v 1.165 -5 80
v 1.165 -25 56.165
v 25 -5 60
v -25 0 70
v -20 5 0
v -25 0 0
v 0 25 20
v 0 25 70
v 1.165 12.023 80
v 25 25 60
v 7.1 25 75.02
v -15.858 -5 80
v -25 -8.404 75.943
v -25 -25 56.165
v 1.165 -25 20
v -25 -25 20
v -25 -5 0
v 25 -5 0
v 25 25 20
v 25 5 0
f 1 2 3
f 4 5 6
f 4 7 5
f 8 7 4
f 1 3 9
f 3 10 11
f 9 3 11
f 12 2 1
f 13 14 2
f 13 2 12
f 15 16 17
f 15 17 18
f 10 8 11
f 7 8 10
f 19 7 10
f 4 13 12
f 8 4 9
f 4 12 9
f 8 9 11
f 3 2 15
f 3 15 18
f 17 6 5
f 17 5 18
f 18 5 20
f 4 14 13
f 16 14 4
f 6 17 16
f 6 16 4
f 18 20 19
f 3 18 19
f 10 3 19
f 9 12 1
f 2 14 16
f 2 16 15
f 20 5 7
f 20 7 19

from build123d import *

# Parameters (mm, degrees)
F0_W        = 50
F0_H        = 50
F1_DEPTH    = 80
F2_T1_DEPTH = 27.2793198937
F2_T3_DEPTH = 202.8653193294
F2_T5_DEPTH = 172.8653193294
F2_T7_DEPTH = 172.8653193294
F3_SIZE     = 25
F4_SIZE     = 10
F5_SIZE     = 20


# Not quite as in the source:
# - a fillet or chamfer that OpenCascade refuses, or shapes differently, is made with other operations: its cross-section is extruded or revolved along the edge and cut away or added


with BuildPart() as f1:
    # F0 (on Top) → F1 (new body)
    with BuildSketch(Plane.XY):
        Rectangle(F0_W, F0_H)
    extrude(amount=F1_DEPTH)

    # F2: chamfer of 20 x 23.8350718519 on 3 edges, made by hand

    # F2_s2 → F2_t1 (cut)
    with BuildSketch(Plane(origin=(23.3481641649, -33.1608518108, 27.825258524), x_dir=(0.8176584321, 0.5757036463, 0), z_dir=(0.4747146788, -0.6742261621, 0.565742924))):
        Polygon((-13.4400778356, 34.368541497), (17.5629425707, 39.0194717243), (-1.9260049086, 63.2741944877), align=None)
    extrude(amount=F2_T1_DEPTH, mode=Mode.SUBTRACT)

    # F2_s4 → F2_t3 (cut)
    with BuildSketch(Plane.XY.offset(-61.4326596647)):
        Polygon((1.1649281481, -25), (25, -5), (25, -25), align=None)
    extrude(amount=F2_T3_DEPTH, mode=Mode.SUBTRACT)

    # F2_s6 → F2_t5 (cut)
    with BuildSketch(Plane.XZ.offset(-86.4326596647)):
        Polygon((25, 60), (1.1649281481, 80), (25, 80), align=None)
    extrude(amount=F2_T5_DEPTH, mode=Mode.SUBTRACT)

    # F2_s8 → F2_t7 (cut)
    with BuildSketch(Plane.YZ.offset(-86.4326596647)):
        Polygon((-25, 56.1649281481), (-5, 80), (-25, 80), align=None)
    extrude(amount=F2_T7_DEPTH, mode=Mode.SUBTRACT)

    # F3
    f3_edges = [f1.edges().sort_by_distance(p)[0] for p in [
        (-25, 25, 40),
    ]]
    chamfer(f3_edges, length=F3_SIZE)

    # F4
    f4_edges = [f1.edges().sort_by_distance(p)[0] for p in [
        (-12.5, 12.5, 80),
    ]]
    chamfer(f4_edges, length=F4_SIZE)

    # F5
    f5_edges = [f1.edges().sort_by_distance(p)[0] for p in [
        (12.5, 25, 0),
        (-11.917536, -25, 0),
    ]]
    chamfer(f5_edges, length=F5_SIZE)


solid = f1.part
